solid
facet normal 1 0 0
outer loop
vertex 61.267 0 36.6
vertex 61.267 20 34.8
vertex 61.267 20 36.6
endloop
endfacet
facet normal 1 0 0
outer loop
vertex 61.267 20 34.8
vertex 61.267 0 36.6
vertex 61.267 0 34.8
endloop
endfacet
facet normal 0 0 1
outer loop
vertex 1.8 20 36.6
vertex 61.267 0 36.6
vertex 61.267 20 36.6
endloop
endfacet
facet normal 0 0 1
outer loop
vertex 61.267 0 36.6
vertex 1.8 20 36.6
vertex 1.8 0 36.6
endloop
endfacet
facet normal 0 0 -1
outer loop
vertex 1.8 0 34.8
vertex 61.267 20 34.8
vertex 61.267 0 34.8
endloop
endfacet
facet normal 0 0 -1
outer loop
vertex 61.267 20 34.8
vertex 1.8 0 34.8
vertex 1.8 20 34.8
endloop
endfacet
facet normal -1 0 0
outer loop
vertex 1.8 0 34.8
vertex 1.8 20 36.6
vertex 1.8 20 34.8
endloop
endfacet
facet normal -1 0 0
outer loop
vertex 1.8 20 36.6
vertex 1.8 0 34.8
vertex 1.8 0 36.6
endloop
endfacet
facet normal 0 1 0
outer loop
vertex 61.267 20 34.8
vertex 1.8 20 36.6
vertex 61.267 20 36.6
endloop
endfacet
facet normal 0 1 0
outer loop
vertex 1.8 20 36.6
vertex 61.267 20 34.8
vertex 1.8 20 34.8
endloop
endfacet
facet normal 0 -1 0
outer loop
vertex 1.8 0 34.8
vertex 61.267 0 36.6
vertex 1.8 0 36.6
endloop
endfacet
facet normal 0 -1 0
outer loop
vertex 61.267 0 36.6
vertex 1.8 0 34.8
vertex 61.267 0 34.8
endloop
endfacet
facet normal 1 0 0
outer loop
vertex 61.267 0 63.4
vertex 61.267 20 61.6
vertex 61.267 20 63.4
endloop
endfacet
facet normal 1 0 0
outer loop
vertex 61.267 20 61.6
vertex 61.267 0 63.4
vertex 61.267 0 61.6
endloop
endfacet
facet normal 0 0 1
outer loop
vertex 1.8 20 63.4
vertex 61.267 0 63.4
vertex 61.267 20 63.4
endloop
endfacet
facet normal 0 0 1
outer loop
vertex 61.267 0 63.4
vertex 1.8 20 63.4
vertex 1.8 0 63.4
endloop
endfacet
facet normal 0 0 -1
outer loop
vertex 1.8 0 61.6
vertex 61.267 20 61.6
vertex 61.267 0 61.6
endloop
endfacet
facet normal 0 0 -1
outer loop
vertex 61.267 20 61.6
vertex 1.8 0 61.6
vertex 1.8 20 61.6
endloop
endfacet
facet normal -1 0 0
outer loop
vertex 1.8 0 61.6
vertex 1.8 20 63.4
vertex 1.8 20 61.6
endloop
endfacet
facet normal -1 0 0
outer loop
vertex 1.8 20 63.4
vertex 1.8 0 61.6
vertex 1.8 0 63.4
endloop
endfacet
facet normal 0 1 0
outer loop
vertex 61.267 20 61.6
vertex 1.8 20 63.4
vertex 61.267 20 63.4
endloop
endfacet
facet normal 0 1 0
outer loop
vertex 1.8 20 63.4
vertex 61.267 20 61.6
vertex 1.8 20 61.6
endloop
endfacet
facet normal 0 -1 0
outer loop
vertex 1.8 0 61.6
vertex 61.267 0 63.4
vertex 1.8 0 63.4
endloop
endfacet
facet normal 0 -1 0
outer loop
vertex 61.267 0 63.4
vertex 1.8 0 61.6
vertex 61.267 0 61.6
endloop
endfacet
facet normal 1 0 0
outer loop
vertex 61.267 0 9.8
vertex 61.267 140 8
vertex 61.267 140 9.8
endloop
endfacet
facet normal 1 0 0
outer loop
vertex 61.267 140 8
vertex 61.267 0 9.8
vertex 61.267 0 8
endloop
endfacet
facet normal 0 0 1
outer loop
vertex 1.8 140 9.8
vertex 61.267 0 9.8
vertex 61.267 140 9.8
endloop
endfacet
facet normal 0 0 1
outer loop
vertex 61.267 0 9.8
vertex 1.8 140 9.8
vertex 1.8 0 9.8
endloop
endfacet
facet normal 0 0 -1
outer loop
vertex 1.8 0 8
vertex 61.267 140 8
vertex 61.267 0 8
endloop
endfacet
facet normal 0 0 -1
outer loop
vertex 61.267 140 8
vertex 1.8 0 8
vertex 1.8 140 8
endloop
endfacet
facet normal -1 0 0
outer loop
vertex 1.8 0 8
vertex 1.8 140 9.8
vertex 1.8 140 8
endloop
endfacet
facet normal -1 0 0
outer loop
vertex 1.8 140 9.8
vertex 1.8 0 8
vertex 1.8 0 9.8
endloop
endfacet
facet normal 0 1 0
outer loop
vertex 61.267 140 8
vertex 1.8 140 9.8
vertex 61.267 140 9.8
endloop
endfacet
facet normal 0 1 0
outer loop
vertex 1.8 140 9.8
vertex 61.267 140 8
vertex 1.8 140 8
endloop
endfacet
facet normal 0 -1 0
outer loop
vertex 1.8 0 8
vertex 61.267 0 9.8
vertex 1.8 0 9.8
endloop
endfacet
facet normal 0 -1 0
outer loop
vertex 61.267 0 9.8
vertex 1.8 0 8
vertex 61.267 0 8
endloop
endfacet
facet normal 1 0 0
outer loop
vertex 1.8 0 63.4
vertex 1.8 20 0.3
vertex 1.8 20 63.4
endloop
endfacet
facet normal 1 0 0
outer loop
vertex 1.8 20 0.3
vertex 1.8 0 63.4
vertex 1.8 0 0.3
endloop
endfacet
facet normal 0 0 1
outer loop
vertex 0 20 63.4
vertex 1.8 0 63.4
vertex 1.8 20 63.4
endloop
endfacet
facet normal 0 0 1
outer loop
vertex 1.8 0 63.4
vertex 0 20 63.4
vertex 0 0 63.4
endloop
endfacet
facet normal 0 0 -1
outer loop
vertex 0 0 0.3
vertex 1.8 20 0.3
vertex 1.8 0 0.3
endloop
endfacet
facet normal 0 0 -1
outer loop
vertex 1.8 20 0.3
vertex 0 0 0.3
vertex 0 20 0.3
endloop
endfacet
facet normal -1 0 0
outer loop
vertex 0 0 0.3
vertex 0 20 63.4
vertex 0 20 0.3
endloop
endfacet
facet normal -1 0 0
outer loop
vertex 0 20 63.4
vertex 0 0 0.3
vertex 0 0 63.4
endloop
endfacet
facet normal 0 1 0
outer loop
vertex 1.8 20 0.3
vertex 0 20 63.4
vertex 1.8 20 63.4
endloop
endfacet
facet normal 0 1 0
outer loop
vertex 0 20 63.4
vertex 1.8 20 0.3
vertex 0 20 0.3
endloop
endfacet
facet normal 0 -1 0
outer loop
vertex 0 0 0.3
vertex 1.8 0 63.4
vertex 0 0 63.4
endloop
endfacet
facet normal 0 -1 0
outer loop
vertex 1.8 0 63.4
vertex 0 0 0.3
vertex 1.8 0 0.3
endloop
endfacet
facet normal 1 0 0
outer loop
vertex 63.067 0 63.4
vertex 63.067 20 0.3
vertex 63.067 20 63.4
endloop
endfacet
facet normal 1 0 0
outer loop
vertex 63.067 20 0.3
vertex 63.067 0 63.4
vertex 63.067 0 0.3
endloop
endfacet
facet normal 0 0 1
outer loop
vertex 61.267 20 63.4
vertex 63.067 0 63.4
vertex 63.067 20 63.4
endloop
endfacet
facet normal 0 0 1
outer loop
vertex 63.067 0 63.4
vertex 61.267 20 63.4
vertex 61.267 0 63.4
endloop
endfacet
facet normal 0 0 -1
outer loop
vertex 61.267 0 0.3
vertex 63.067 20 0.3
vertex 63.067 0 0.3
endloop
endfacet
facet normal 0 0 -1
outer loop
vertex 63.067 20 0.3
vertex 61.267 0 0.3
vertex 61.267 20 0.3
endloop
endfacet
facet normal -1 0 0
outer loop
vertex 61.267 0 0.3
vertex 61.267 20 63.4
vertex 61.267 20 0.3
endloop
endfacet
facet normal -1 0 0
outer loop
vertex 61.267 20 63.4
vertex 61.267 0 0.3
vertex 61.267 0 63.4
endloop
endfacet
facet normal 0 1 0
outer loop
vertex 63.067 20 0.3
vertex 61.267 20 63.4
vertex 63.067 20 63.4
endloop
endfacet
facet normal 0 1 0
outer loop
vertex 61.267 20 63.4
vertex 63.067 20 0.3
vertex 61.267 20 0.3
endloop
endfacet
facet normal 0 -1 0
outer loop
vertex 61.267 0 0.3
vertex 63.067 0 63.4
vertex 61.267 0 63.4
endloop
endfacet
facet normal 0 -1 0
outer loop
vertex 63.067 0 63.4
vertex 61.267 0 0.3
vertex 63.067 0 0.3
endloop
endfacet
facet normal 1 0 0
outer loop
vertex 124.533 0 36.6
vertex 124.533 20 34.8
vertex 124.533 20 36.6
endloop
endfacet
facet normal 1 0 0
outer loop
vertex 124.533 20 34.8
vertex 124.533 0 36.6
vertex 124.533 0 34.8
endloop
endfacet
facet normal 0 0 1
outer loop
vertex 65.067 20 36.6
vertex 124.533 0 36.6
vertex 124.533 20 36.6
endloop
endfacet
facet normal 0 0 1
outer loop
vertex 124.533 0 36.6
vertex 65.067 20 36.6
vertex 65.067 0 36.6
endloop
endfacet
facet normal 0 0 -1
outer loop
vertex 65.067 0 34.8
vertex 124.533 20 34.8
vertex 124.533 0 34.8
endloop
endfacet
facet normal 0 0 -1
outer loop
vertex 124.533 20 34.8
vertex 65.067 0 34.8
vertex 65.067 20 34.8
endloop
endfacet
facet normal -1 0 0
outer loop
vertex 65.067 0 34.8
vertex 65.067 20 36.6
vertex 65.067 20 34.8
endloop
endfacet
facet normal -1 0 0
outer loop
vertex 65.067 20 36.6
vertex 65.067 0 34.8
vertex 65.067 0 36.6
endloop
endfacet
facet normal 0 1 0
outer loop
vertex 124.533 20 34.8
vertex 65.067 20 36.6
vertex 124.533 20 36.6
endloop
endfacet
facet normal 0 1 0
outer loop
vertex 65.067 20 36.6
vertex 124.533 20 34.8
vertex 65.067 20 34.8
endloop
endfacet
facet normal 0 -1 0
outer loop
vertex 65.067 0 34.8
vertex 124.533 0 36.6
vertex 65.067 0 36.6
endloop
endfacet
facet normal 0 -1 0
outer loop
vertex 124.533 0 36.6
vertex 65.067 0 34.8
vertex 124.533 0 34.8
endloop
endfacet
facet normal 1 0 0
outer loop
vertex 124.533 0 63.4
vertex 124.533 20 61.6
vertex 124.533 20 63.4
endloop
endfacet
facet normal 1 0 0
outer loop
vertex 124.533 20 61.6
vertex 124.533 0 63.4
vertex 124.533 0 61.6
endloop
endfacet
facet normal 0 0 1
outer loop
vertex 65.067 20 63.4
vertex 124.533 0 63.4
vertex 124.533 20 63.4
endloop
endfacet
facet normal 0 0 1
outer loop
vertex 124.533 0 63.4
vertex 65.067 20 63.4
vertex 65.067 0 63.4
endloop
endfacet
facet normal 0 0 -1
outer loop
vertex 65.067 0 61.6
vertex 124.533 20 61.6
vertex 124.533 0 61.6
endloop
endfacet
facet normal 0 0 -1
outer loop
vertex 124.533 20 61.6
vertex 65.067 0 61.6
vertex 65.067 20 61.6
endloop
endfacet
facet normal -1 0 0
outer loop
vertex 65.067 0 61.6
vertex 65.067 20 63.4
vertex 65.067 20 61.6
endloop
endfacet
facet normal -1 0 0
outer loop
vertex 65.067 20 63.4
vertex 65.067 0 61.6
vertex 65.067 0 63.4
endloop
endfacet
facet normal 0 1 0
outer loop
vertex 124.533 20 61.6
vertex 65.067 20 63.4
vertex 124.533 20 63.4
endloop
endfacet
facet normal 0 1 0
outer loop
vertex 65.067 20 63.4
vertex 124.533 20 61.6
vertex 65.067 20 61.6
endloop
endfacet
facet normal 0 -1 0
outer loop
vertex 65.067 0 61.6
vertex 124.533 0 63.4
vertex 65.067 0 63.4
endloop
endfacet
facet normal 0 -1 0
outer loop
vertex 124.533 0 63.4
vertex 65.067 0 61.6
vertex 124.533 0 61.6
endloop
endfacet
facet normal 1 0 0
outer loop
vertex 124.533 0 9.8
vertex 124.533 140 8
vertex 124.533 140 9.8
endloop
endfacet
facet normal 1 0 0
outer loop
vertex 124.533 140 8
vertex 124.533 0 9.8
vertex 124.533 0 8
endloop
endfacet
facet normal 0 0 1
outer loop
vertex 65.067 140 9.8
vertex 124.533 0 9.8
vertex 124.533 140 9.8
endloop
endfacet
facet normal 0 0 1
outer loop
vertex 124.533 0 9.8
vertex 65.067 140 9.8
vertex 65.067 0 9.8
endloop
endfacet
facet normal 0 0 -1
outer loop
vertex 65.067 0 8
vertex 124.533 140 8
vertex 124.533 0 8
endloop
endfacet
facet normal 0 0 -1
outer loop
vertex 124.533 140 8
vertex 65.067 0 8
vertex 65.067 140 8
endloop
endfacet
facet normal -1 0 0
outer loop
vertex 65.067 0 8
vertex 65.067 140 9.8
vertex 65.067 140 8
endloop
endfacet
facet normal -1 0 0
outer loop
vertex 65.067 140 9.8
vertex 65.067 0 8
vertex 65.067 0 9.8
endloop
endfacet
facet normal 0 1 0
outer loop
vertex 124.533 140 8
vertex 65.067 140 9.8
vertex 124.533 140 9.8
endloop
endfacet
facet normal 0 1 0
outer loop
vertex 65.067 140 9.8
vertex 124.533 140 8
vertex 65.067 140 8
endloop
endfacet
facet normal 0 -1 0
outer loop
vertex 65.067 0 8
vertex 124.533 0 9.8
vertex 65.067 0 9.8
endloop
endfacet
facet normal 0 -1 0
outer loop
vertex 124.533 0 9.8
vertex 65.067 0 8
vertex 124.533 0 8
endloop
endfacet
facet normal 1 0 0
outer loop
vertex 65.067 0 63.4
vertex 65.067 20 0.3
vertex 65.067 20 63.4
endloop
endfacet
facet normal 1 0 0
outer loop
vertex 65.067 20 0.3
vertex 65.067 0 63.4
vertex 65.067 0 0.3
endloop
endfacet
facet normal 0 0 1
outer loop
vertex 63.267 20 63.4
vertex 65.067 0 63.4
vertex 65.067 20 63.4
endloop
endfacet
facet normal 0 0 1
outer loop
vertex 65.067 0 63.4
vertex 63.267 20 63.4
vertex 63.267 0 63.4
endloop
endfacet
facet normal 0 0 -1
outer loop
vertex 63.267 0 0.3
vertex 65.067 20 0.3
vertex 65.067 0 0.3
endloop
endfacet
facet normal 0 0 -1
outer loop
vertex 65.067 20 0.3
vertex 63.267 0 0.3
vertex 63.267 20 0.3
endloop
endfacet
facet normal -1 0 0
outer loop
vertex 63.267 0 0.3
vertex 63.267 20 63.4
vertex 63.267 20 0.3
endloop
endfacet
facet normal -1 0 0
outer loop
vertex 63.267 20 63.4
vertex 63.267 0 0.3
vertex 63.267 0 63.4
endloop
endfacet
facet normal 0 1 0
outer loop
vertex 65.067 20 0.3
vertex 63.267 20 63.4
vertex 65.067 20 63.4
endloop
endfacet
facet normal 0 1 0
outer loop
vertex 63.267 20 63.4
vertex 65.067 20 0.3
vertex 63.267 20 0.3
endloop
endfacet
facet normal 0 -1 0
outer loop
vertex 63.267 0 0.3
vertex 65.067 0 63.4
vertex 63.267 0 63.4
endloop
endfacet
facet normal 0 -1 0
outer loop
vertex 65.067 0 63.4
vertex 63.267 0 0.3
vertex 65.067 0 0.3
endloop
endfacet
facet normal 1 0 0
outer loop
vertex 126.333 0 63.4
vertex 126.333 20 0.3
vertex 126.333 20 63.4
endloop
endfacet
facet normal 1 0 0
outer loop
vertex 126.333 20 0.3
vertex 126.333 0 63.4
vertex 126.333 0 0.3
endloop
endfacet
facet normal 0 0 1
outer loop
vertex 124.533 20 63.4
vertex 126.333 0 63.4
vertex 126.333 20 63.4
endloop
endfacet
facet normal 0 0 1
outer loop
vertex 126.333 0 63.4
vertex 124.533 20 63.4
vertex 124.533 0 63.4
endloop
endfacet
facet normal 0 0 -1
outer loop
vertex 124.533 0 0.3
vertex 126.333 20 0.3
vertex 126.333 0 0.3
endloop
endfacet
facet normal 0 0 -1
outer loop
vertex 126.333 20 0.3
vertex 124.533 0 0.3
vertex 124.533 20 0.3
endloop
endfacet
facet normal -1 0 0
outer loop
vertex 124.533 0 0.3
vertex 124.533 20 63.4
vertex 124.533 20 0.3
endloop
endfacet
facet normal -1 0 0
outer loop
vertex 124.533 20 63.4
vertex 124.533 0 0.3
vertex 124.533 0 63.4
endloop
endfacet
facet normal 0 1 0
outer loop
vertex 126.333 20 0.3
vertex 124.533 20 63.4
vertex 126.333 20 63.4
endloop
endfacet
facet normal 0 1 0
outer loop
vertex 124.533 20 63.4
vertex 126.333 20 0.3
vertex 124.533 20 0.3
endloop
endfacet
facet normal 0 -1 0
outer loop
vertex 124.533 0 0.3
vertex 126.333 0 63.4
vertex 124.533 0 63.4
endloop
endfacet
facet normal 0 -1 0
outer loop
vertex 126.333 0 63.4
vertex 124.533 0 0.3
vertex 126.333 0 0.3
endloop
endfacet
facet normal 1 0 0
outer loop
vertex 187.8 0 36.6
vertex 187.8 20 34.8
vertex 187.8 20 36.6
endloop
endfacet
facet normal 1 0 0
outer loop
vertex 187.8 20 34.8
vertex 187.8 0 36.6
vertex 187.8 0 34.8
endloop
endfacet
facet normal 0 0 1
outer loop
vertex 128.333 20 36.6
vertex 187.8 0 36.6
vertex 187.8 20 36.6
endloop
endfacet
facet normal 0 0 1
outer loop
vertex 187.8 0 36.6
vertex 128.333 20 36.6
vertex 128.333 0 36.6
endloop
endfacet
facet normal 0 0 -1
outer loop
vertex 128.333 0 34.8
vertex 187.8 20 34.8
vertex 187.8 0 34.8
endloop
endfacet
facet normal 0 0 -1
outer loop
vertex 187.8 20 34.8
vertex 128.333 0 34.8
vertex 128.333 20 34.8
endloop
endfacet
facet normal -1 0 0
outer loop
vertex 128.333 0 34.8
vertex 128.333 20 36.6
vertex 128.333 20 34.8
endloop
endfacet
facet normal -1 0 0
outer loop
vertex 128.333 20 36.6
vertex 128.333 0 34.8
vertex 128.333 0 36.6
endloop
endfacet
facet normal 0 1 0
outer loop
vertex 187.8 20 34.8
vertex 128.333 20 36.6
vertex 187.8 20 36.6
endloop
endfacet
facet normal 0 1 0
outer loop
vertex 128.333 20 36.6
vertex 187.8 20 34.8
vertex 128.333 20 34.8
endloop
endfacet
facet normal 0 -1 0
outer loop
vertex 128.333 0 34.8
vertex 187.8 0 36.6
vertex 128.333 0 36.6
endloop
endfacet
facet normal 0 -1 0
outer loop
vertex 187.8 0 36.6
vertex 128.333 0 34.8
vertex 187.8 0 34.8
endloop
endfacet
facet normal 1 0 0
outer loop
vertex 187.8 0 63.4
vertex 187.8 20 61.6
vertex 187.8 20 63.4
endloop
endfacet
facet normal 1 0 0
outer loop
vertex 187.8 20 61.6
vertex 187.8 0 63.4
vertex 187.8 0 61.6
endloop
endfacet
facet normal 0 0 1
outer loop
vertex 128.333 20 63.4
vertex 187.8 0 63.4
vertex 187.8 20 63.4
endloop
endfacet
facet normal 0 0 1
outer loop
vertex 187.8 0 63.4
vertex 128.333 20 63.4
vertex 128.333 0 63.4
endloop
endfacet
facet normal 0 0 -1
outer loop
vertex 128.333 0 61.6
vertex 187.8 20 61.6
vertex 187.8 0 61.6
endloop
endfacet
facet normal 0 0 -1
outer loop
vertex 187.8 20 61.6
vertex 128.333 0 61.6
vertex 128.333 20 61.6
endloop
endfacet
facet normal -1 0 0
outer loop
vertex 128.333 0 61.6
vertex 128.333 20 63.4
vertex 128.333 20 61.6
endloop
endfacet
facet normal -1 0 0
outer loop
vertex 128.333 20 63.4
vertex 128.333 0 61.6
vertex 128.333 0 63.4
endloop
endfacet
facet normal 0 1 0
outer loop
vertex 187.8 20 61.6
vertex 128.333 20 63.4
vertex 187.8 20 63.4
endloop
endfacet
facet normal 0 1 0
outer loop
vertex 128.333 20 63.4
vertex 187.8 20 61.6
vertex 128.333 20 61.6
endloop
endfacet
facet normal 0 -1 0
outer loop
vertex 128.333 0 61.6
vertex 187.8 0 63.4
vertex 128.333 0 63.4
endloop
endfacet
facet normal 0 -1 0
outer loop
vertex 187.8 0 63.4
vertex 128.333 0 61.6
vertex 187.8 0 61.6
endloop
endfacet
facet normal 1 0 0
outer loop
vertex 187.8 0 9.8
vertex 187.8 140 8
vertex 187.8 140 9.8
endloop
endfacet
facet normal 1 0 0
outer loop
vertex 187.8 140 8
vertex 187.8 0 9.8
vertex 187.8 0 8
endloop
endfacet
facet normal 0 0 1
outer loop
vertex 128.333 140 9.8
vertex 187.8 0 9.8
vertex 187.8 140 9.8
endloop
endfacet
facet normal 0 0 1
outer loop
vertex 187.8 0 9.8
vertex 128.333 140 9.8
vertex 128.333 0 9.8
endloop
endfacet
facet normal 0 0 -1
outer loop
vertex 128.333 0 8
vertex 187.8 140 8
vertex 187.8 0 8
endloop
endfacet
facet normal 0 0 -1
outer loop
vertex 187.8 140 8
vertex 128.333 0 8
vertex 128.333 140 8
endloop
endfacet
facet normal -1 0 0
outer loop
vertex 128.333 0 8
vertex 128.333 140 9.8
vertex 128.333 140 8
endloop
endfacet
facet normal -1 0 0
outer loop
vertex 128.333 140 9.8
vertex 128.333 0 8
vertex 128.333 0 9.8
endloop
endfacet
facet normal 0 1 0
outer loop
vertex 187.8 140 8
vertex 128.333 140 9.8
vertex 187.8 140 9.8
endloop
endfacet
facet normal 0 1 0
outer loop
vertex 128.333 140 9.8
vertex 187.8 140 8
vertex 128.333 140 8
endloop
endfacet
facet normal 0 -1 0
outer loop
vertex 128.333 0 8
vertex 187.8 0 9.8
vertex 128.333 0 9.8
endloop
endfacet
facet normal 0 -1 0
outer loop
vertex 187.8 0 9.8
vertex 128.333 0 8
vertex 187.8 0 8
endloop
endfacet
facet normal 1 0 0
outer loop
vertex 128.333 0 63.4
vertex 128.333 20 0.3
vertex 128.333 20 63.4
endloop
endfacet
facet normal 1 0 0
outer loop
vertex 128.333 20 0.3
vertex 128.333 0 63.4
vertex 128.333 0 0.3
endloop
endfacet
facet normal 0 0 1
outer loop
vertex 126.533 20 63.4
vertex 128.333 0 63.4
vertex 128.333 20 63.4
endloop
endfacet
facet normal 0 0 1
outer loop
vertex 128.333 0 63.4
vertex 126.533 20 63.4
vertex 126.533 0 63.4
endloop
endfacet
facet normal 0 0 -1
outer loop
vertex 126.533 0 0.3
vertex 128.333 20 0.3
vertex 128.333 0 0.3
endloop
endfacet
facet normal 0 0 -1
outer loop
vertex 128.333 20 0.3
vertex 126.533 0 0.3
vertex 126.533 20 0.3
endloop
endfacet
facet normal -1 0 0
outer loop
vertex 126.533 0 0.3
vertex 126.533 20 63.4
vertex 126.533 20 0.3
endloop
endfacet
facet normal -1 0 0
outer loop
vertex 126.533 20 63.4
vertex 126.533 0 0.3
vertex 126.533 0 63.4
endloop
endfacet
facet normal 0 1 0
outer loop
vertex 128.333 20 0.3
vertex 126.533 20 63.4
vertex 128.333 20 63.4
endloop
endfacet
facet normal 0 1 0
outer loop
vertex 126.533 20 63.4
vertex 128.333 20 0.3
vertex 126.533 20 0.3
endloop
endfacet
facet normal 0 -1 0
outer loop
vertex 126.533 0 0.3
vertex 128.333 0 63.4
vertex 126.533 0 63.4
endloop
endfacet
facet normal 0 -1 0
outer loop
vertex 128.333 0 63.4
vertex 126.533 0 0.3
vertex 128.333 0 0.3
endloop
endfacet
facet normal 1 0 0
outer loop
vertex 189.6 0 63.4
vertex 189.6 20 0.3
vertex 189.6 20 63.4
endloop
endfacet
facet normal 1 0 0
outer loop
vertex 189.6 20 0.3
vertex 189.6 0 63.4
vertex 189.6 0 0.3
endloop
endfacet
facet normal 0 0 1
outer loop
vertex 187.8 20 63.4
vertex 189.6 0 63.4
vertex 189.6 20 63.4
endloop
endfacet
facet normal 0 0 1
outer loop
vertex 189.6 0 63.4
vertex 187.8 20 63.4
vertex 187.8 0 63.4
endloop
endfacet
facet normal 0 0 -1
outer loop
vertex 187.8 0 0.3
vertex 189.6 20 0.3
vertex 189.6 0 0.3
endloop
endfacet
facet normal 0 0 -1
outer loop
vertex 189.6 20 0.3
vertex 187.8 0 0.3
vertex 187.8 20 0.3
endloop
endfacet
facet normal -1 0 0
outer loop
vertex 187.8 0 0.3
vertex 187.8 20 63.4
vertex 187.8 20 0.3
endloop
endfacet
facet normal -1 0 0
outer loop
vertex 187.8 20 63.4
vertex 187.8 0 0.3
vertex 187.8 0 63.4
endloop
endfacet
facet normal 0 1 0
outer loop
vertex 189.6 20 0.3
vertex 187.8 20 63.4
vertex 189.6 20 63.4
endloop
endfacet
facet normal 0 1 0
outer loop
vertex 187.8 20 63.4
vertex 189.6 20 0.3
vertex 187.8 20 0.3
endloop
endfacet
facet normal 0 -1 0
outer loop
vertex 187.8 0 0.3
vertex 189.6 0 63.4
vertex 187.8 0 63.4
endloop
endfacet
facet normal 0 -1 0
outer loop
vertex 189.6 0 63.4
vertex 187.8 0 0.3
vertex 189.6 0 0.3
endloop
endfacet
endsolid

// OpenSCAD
// all lengths are in cm
// 
// width, depth, height should be understood as if looking at the
// bed from the long side

bedWidth             = 200;
bedDepth             = 140;

standardGap          = 0.2;
floorGap             = 0.3;

postWidth            = 5;
postDepth            = 5;

wheelHeight          = 8;

bookshelfSlabWidth   = 1.8;
bookshelfCount       = 3;
bookshelfLedgeHeight = wheelHeight - floorGap;

bookshelfFloorCount  = 2;
bookshelfFloorHeight = 25;
bookshelfFloorDepth  = 20;
bookshelfFloorWidth  = (bedWidth  -  2 * postWidth
                                  -  (bookshelfCount + 1) * standardGap
                                  -  2 * bookshelfCount * bookshelfSlabWidth
                       ) / bookshelfCount;

bookshelfWidth       = bookshelfFloorWidth
                       +  2 * bookshelfSlabWidth;
bookshelfDepth       = bedDepth;
bookshelfHeight      = bookshelfFloorCount * bookshelfFloorHeight
                       +  (bookshelfFloorCount + 1) * bookshelfSlabWidth
                       +  bookshelfLedgeHeight;

module bookshelf() {
  translate([bookshelfSlabWidth, 0, floorGap + bookshelfLedgeHeight]) {
    cube([bookshelfFloorWidth, bookshelfDepth, bookshelfSlabWidth]);

    for (i = [1 : bookshelfFloorCount]) {
      translate([0, 0, i * (bookshelfFloorHeight + bookshelfSlabWidth)]) {
        cube([bookshelfFloorWidth, bookshelfFloorDepth, bookshelfSlabWidth]);
      }
    }
  }

  translate([0, 0, floorGap]) {
    cube([bookshelfSlabWidth, bookshelfFloorDepth, bookshelfHeight]);
  }
  translate([bookshelfSlabWidth + bookshelfFloorWidth, 0, floorGap]) {
    cube([bookshelfSlabWidth, bookshelfFloorDepth, bookshelfHeight]);
  }
}


for (i = [1 : bookshelfCount]) {
  translate([(i - 1) * (bookshelfWidth + standardGap), 0, 0]) bookshelf();
}
